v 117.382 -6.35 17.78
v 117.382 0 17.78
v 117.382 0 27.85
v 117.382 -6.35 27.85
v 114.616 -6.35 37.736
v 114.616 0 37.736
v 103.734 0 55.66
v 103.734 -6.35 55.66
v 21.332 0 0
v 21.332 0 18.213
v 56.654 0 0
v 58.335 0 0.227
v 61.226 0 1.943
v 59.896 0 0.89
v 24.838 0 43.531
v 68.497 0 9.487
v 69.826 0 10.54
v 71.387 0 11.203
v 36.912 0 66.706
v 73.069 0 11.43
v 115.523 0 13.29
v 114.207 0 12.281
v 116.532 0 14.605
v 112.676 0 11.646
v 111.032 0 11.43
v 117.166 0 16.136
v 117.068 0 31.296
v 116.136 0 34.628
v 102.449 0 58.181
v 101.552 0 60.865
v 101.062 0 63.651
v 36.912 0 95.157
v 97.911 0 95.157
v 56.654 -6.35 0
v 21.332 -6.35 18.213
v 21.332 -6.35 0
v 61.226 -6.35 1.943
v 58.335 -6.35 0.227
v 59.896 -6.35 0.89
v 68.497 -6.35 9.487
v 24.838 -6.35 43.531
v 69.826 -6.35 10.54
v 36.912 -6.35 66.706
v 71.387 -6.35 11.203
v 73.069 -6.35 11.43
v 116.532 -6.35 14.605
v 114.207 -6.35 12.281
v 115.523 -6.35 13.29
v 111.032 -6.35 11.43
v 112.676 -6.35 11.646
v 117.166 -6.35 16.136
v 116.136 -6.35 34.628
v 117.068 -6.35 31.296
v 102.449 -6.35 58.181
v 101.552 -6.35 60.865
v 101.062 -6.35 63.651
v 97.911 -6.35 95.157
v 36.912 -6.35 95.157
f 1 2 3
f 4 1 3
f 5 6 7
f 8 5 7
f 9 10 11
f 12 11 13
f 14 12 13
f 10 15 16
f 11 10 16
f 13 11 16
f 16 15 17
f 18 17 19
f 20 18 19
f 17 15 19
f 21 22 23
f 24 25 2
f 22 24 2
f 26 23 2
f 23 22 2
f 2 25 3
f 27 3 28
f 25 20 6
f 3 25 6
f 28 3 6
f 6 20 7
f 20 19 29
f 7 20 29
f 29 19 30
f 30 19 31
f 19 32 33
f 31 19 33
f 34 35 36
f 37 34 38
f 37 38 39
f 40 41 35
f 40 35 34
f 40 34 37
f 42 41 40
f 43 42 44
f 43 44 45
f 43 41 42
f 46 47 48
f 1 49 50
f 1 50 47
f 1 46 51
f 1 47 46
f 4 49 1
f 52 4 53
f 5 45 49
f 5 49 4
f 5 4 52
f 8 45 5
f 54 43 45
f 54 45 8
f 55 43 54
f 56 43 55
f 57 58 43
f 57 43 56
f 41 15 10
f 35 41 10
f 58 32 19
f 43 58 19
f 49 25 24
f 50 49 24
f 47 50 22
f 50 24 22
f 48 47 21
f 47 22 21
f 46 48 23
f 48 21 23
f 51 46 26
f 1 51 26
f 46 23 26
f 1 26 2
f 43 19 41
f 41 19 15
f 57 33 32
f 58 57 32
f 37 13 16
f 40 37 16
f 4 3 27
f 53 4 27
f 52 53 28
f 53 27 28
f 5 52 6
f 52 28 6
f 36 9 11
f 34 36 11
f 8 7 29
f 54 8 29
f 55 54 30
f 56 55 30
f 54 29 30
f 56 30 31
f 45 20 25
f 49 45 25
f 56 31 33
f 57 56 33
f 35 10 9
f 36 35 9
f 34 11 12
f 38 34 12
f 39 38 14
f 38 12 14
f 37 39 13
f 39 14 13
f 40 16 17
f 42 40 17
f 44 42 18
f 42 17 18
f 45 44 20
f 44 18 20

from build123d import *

# Parameters (mm, degrees)
F1_DEPTH = 6.35


with BuildPart() as f1:
    # F0 (on Front) → F1 (new body)
    with BuildSketch(Plane.XZ):
        with BuildLine():
            Line((21.332435, 18.212982), (21.332435, 0))
            Line((21.332435, 0), (56.653813, 0))
            ThreePointArc((56.653813, 0), (59.137729, 0.505972), (61.225805, 1.943257))
            Line((61.225805, 1.943257), (68.496529, 9.486627))
            ThreePointArc((68.496529, 9.486627), (70.584605, 10.923911), (73.068521, 11.429884))
            Line((73.068521, 11.429884), (111.03247, 11.429884))
            ThreePointArc((111.03247, 11.429884), (115.522598, 13.289755), (117.38247, 17.779884))
            Line((117.38247, 17.779884), (117.38247, 27.849807))
            ThreePointArc((117.38247, 27.849807), (116.677864, 32.982936), (114.616169, 37.736345))
            Line((114.616169, 37.736345), (103.733808, 55.660222))
            ThreePointArc((103.733808, 55.660222), (101.950588, 59.506153), (101.062049, 63.651216))
            Line((101.062049, 63.651216), (97.911447, 95.157258))
            Line((97.911447, 95.157258), (36.912486, 95.157258))
            Line((36.912486, 95.157258), (36.912486, 66.70589))
            Line((36.912486, 66.70589), (24.837947, 43.530565))
            Line((24.837947, 43.530565), (21.332435, 18.212982))
        make_face()
    extrude(amount=F1_DEPTH)


solid = f1.part
